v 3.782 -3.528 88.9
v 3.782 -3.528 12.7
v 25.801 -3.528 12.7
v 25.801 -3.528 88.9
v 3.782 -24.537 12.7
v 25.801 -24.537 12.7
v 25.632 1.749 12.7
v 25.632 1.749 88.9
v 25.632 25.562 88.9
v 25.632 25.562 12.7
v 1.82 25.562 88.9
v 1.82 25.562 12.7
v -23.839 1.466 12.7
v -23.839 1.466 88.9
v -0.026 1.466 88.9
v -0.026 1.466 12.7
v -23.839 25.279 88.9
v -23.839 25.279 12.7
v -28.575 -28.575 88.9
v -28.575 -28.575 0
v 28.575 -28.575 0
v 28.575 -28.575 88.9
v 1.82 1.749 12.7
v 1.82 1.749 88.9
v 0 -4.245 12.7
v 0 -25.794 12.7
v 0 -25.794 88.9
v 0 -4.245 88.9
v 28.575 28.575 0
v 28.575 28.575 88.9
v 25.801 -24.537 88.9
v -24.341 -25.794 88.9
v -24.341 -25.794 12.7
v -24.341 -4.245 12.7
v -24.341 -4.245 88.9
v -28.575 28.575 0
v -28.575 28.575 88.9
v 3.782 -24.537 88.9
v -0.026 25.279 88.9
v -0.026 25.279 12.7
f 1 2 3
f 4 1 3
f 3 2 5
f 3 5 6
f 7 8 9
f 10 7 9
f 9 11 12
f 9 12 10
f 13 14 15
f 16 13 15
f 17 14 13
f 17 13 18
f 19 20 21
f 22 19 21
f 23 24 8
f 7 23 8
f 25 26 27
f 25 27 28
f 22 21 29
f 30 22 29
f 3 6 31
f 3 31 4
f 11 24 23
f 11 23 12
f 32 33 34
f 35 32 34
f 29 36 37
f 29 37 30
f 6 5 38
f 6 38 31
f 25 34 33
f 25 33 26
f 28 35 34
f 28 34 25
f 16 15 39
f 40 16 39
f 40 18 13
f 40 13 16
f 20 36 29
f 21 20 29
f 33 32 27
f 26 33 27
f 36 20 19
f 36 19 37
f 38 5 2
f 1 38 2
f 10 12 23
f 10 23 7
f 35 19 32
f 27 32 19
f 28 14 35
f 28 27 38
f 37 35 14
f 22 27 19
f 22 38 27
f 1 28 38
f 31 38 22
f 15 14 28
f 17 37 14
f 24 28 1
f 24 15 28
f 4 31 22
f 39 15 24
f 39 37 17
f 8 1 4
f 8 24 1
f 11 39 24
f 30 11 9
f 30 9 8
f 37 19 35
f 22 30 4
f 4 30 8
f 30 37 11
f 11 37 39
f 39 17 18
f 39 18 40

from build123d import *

# Parameters (mm, degrees)
F0_W     = 57.15
F0_H     = 57.15
F1_DEPTH = 88.9
F2_W     = 23.8125
F2_H     = 23.8125
F3_DEPTH = 76.2
F4_W     = 23.8125
F4_H     = 23.8125
F5_DEPTH = 76.2
F6_W     = 24.340702
F6_H     = 21.549652
F7_DEPTH = 76.2
F8_W     = 22.018882
F8_H     = 21.008313
F9_DEPTH = 76.2


with BuildPart() as f1:
    # F0 (on Top) → F1 (new body)
    with BuildSketch(Plane.XY):
        Rectangle(F0_W, F0_H)
    extrude(amount=F1_DEPTH)

    # F2 (on face) → F3 (cut)
    with BuildSketch(Plane.XY.offset(88.9)):
        with Locations((13.726034, 13.655303)):
            Rectangle(F2_W, F2_H)
    extrude(amount=-F3_DEPTH, mode=Mode.SUBTRACT)

    # F4 (on face) → F5 (cut)
    with BuildSketch(Plane.XY.offset(88.9)):
        with Locations((-11.932438, 13.372463)):
            Rectangle(F4_W, F4_H)
    extrude(amount=-F5_DEPTH, mode=Mode.SUBTRACT)

    # F6 (on face) → F7 (cut)
    with BuildSketch(Plane.XY.offset(88.9)):
        with Locations((-12.170351, -15.019511)):
            Rectangle(F6_W, F6_H)
    extrude(amount=-F7_DEPTH, mode=Mode.SUBTRACT)

    # F8 (on face) → F9 (cut)
    with BuildSketch(Plane.XY.offset(88.9)):
        with Locations((14.791763, -14.032443)):
            Rectangle(F8_W, F8_H)
    extrude(amount=-F9_DEPTH, mode=Mode.SUBTRACT)


solid = f1.part
